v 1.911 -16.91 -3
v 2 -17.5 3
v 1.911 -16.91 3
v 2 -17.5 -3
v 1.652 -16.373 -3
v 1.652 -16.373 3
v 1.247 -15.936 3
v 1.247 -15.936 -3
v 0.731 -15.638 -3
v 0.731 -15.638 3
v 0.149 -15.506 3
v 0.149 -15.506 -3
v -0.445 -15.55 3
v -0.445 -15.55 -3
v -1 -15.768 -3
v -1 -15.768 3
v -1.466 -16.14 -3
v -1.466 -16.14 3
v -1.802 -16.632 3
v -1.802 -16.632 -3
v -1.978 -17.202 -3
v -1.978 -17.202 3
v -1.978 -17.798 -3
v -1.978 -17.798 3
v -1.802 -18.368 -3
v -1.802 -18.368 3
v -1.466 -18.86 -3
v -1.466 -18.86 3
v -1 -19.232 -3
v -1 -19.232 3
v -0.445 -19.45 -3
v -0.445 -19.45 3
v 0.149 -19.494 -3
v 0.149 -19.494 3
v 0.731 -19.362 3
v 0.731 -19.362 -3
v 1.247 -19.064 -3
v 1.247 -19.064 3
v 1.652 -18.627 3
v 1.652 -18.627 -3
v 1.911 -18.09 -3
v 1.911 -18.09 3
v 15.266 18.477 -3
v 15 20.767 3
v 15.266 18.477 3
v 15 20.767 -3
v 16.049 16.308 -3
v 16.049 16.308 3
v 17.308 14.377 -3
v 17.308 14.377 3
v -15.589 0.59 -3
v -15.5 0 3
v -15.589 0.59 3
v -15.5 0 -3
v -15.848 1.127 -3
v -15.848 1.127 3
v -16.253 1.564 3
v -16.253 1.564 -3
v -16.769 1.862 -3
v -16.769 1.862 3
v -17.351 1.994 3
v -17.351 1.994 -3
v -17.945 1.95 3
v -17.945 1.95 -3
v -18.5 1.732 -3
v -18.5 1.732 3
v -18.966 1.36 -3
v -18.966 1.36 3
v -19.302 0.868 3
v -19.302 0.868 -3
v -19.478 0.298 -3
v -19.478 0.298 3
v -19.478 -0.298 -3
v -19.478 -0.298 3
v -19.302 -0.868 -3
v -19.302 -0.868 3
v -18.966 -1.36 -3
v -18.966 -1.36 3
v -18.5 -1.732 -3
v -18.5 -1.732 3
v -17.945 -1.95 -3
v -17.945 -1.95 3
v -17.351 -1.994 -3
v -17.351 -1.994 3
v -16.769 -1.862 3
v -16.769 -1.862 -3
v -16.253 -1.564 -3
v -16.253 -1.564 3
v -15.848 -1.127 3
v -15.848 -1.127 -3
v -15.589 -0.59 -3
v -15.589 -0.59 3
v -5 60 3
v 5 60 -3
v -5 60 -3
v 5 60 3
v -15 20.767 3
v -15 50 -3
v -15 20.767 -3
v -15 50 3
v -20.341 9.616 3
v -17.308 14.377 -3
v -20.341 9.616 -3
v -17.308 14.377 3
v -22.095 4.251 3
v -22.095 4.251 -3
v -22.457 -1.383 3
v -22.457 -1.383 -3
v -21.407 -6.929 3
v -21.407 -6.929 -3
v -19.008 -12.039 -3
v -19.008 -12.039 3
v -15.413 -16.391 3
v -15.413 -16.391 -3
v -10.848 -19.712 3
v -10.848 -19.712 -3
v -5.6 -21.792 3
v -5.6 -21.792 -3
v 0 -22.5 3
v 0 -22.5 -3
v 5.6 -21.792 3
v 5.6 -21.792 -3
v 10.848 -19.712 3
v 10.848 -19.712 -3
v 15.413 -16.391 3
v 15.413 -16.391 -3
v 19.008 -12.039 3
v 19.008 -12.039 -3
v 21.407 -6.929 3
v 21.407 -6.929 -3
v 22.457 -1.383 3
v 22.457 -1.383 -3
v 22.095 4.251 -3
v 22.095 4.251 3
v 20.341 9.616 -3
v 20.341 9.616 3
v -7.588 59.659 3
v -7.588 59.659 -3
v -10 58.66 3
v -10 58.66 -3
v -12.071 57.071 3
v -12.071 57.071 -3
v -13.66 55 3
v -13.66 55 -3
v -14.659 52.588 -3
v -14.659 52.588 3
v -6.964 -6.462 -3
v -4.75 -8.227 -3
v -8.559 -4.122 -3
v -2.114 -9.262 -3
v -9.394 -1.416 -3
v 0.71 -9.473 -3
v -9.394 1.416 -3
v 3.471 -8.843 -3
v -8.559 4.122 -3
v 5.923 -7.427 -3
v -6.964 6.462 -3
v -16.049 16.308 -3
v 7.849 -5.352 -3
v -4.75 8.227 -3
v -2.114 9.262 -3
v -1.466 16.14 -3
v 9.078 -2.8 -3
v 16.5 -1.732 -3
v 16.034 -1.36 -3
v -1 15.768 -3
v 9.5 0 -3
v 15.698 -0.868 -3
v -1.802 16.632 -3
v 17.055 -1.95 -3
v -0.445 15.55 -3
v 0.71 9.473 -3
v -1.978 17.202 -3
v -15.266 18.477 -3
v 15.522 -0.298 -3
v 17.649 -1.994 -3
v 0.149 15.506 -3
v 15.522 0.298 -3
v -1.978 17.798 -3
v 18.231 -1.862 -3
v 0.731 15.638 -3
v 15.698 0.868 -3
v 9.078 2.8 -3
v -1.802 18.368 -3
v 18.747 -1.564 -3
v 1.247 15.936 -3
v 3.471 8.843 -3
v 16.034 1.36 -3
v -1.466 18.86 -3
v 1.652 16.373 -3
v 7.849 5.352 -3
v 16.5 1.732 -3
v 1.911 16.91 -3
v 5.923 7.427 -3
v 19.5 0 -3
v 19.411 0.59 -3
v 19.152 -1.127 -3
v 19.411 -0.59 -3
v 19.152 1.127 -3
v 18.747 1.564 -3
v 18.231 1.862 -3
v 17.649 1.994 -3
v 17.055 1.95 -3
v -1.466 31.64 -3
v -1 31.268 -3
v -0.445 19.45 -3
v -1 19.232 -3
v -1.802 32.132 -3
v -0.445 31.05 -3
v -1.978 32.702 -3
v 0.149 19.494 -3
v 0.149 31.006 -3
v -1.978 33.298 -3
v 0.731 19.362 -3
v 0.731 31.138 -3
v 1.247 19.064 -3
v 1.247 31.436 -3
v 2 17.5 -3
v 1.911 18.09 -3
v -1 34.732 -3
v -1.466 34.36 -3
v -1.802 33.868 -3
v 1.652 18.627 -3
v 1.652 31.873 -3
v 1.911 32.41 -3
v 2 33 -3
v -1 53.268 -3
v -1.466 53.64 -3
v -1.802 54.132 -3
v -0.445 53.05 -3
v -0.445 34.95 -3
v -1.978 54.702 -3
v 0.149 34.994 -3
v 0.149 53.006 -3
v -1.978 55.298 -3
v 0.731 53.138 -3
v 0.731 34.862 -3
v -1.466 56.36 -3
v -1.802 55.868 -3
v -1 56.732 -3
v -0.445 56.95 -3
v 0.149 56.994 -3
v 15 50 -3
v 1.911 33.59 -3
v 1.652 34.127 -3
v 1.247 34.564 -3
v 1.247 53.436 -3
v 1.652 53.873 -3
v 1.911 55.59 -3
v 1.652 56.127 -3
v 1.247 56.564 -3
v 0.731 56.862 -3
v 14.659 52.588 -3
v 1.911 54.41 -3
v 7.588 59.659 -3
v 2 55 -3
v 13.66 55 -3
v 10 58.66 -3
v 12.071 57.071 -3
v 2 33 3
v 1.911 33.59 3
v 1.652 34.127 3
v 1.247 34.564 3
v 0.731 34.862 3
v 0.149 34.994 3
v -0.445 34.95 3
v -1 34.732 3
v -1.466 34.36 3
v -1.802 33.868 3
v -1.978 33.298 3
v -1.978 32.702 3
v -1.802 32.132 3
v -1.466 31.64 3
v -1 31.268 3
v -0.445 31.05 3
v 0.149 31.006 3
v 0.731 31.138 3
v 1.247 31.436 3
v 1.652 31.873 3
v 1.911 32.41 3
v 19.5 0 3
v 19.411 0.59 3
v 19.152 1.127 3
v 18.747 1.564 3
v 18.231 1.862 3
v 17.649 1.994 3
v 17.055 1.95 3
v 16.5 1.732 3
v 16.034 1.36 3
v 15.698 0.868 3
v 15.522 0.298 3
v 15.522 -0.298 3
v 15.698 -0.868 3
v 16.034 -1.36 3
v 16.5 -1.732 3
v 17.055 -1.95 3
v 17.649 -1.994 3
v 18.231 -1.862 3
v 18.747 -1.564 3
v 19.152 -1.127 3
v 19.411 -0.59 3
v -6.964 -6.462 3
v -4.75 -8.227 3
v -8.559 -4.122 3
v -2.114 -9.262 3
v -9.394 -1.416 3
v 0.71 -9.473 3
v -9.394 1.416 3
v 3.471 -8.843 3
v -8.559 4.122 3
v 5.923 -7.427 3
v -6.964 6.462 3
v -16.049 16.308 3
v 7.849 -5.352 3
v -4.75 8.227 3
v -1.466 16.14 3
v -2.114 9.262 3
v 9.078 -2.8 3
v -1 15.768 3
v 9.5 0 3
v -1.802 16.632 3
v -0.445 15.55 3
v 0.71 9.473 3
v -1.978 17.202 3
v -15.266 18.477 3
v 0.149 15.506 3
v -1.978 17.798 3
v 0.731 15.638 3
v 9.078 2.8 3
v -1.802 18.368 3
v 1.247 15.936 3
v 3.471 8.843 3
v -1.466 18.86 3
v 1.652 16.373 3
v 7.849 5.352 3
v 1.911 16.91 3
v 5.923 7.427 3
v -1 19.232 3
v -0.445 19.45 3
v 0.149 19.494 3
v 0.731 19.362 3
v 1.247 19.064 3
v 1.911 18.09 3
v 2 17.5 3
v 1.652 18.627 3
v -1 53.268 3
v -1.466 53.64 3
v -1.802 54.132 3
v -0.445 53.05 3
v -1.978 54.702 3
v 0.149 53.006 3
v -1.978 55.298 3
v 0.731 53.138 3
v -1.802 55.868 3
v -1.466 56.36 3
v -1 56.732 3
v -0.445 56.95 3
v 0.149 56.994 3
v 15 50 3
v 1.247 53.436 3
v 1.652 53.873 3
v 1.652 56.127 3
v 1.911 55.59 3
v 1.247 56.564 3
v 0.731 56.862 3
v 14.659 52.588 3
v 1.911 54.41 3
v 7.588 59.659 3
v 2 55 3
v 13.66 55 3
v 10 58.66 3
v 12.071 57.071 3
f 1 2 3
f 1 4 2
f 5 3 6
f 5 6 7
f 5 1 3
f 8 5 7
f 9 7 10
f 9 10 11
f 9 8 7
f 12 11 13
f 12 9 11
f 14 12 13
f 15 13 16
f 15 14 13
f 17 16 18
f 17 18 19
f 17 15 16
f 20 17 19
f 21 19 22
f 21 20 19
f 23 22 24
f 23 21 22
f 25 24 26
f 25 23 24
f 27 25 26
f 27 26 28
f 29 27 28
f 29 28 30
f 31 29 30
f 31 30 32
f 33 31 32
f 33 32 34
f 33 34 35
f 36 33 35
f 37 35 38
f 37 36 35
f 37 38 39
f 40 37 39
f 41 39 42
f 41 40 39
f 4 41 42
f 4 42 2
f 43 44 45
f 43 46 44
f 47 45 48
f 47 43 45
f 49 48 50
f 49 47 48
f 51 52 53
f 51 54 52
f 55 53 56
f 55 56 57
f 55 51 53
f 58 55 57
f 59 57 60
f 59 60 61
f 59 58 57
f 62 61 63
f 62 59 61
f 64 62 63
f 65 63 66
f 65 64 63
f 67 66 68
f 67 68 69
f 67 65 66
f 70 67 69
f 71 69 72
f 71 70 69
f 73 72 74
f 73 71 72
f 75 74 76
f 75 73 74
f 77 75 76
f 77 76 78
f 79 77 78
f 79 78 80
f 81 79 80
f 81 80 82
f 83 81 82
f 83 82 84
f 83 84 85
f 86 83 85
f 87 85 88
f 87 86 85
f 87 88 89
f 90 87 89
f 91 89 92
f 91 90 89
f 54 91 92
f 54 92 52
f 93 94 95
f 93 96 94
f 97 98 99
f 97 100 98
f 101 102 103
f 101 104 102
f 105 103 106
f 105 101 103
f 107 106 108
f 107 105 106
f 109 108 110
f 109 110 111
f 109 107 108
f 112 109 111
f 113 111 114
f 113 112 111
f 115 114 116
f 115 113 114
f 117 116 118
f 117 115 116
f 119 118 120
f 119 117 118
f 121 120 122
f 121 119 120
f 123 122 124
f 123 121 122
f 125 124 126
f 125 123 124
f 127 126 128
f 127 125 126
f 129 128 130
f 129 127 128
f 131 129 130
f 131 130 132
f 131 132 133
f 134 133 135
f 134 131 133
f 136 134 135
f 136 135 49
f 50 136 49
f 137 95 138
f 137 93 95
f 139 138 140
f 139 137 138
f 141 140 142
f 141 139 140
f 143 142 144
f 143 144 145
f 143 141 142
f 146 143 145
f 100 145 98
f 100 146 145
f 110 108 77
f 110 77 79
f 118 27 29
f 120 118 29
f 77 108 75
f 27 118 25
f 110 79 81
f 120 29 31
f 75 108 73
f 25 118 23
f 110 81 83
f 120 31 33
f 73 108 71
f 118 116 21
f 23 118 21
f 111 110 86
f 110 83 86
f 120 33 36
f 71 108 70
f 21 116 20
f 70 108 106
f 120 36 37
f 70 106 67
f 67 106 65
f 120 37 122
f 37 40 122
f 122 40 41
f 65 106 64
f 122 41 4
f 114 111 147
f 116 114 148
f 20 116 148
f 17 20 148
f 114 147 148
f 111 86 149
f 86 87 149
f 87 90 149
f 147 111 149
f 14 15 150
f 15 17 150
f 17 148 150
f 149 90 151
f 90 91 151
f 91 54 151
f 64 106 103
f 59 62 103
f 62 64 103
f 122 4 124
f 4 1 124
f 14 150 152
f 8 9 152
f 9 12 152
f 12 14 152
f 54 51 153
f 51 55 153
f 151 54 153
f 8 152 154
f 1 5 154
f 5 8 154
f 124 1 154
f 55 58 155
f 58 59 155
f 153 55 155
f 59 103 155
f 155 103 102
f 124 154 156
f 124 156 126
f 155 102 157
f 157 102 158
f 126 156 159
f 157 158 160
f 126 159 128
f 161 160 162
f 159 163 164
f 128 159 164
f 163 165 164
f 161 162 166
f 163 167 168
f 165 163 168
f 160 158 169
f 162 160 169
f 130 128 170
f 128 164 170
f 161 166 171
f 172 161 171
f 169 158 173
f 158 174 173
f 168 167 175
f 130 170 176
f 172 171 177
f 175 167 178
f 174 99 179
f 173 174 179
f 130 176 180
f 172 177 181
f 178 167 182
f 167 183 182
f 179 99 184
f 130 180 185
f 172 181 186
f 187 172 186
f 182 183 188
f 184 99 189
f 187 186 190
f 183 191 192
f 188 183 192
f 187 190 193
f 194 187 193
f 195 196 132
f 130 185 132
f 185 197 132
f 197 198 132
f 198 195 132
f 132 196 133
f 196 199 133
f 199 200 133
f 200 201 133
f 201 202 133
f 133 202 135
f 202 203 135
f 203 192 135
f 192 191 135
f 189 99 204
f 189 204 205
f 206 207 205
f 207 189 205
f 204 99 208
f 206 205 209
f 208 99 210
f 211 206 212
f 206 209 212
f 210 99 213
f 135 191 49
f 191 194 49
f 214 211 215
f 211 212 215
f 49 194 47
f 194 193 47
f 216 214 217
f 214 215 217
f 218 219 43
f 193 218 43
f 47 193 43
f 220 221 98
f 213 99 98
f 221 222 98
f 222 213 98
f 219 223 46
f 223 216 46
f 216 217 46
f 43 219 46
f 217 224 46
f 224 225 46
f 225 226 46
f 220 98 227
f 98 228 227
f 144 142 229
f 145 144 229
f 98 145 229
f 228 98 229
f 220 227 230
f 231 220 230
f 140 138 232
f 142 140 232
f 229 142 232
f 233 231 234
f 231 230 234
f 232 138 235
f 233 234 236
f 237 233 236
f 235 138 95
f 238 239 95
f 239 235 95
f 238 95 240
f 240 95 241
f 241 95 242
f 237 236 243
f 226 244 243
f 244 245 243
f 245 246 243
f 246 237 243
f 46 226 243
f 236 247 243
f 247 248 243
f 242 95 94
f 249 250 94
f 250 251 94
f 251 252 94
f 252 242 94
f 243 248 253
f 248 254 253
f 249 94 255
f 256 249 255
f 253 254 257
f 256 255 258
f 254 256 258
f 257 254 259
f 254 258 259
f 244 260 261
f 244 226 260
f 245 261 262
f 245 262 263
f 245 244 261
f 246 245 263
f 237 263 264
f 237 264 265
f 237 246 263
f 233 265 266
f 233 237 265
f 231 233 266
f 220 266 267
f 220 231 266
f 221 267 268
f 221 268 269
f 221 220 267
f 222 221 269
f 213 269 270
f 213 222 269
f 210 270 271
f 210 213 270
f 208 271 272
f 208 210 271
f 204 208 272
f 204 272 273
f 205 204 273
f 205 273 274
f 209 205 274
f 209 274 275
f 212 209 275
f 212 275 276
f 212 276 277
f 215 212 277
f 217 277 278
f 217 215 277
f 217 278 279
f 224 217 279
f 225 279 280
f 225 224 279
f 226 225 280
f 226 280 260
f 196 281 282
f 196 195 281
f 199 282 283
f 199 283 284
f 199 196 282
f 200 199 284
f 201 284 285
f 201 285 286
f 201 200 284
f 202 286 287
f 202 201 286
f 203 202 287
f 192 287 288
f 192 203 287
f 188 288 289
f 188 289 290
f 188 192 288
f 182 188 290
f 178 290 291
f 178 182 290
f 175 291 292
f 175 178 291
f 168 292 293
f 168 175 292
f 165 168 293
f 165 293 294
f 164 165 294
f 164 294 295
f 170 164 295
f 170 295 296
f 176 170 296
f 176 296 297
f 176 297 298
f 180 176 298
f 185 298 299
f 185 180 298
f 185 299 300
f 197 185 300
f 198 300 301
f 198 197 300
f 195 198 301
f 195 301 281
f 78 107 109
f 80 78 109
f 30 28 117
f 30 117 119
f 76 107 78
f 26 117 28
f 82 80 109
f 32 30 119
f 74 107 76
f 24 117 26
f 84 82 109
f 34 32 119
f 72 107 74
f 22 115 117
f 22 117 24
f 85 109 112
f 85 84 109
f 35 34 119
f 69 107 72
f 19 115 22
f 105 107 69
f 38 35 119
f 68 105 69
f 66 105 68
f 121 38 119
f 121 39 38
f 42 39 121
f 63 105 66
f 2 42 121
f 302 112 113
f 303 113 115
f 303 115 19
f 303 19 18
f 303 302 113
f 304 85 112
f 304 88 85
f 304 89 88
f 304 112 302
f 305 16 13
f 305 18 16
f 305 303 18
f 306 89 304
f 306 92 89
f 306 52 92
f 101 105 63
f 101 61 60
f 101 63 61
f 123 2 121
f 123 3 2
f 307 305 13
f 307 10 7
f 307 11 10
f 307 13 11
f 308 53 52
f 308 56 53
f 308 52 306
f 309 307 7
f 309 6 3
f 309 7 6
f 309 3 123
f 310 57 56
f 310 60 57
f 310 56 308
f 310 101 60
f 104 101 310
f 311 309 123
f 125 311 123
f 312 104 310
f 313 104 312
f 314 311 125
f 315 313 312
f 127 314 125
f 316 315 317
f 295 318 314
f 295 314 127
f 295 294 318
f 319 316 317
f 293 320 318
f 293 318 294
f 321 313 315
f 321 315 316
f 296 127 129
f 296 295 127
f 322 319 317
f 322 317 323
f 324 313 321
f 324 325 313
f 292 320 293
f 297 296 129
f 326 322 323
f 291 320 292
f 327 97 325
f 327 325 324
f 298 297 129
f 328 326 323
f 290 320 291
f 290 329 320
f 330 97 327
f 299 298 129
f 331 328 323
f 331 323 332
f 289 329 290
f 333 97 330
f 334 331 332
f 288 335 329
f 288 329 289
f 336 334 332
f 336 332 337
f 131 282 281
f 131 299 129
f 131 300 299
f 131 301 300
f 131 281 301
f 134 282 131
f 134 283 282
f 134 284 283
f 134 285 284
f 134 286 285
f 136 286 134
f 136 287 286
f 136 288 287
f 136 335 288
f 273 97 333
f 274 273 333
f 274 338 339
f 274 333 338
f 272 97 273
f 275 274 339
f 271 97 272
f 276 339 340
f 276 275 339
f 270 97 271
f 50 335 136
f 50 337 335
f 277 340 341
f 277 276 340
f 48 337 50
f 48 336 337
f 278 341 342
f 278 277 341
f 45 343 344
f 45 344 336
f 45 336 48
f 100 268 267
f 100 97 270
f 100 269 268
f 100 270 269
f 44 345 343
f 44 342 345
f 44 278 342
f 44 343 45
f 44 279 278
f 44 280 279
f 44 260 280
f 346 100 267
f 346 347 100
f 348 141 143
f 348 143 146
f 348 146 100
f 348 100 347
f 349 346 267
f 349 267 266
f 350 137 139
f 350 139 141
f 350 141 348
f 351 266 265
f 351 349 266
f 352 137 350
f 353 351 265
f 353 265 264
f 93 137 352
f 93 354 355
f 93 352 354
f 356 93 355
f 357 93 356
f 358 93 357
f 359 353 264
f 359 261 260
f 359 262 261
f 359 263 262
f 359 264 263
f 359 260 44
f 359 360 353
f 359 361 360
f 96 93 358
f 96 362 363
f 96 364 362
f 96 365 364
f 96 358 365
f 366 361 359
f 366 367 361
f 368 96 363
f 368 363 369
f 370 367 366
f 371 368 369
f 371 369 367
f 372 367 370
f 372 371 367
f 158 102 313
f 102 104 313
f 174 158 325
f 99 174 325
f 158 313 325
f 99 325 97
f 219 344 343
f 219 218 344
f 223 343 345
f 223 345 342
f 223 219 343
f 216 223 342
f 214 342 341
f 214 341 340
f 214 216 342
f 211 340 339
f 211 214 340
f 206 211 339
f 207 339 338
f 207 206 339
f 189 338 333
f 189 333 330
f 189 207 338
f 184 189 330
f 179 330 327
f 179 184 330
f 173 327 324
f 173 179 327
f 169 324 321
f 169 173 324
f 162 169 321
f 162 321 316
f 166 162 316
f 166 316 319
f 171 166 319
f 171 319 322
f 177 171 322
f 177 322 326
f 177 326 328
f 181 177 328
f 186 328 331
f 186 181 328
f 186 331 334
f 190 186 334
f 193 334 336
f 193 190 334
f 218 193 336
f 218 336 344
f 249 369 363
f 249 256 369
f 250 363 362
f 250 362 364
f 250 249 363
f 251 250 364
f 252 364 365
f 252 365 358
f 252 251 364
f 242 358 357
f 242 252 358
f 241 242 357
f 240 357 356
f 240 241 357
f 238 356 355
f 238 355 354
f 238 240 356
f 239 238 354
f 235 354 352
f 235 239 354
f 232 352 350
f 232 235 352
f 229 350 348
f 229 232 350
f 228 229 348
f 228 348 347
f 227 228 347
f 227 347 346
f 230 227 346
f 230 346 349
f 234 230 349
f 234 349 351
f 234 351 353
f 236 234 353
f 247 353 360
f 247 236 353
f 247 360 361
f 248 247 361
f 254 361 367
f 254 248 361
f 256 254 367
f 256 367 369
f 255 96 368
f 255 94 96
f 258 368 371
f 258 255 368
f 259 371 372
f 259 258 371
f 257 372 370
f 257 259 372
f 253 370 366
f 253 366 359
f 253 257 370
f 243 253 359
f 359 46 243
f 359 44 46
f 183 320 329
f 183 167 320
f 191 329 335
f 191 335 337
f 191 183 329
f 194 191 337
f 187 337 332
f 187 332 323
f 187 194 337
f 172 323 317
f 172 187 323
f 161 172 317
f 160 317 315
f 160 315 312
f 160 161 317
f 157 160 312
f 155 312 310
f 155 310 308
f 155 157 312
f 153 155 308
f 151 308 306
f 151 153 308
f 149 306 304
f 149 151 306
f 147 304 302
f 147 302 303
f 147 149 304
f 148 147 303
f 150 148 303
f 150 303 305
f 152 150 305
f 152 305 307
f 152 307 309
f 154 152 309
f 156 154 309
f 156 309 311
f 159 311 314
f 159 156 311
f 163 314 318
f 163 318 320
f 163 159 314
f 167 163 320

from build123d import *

# Parameters (mm, degrees)
SKETCH1_R           = 2
SKETCH1_R_2         = 9.5
BOSS_EXTRUDE1_DEPTH = 3
FILLET1_R           = 10


with BuildPart() as part:
    # Sketch1 → Boss-Extrude1 (new, symmetric)
    with BuildSketch(Plane.XY):
        with BuildLine():
            Line((15, 60), (-15, 60))
            Line((-15, 60), (-15, 16.770509831))
            ThreePointArc((-15, 16.770509831), (0, -22.5), (15, 16.770509831))
            Line((15, 16.770509831), (15, 60))
        make_face()
        with Locations((0, 33)):
            Circle(SKETCH1_R, mode=Mode.SUBTRACT)
        with Locations((0, 55)):
            Circle(SKETCH1_R, mode=Mode.SUBTRACT)
        with Locations((17.5, 0)):
            Circle(SKETCH1_R, mode=Mode.SUBTRACT)
        with Locations((-17.5, 0)):
            Circle(SKETCH1_R, mode=Mode.SUBTRACT)
        with Locations((0, -17.5)):
            Circle(SKETCH1_R, mode=Mode.SUBTRACT)
        Circle(SKETCH1_R_2, mode=Mode.SUBTRACT)
        with Locations((0, 17.5)):
            Circle(SKETCH1_R, mode=Mode.SUBTRACT)
    extrude(amount=BOSS_EXTRUDE1_DEPTH, both=True)

    # Fillet1
    fillet1_edges = [part.edges().sort_by_distance(p)[0] for p in [
        (-15, 60, 0),
        (15, 60, 0),
        (15, 16.770509831, 0),
        (-15, 16.770509831, 0),
    ]]
    fillet(fillet1_edges, radius=FILLET1_R)


solid = part.part
